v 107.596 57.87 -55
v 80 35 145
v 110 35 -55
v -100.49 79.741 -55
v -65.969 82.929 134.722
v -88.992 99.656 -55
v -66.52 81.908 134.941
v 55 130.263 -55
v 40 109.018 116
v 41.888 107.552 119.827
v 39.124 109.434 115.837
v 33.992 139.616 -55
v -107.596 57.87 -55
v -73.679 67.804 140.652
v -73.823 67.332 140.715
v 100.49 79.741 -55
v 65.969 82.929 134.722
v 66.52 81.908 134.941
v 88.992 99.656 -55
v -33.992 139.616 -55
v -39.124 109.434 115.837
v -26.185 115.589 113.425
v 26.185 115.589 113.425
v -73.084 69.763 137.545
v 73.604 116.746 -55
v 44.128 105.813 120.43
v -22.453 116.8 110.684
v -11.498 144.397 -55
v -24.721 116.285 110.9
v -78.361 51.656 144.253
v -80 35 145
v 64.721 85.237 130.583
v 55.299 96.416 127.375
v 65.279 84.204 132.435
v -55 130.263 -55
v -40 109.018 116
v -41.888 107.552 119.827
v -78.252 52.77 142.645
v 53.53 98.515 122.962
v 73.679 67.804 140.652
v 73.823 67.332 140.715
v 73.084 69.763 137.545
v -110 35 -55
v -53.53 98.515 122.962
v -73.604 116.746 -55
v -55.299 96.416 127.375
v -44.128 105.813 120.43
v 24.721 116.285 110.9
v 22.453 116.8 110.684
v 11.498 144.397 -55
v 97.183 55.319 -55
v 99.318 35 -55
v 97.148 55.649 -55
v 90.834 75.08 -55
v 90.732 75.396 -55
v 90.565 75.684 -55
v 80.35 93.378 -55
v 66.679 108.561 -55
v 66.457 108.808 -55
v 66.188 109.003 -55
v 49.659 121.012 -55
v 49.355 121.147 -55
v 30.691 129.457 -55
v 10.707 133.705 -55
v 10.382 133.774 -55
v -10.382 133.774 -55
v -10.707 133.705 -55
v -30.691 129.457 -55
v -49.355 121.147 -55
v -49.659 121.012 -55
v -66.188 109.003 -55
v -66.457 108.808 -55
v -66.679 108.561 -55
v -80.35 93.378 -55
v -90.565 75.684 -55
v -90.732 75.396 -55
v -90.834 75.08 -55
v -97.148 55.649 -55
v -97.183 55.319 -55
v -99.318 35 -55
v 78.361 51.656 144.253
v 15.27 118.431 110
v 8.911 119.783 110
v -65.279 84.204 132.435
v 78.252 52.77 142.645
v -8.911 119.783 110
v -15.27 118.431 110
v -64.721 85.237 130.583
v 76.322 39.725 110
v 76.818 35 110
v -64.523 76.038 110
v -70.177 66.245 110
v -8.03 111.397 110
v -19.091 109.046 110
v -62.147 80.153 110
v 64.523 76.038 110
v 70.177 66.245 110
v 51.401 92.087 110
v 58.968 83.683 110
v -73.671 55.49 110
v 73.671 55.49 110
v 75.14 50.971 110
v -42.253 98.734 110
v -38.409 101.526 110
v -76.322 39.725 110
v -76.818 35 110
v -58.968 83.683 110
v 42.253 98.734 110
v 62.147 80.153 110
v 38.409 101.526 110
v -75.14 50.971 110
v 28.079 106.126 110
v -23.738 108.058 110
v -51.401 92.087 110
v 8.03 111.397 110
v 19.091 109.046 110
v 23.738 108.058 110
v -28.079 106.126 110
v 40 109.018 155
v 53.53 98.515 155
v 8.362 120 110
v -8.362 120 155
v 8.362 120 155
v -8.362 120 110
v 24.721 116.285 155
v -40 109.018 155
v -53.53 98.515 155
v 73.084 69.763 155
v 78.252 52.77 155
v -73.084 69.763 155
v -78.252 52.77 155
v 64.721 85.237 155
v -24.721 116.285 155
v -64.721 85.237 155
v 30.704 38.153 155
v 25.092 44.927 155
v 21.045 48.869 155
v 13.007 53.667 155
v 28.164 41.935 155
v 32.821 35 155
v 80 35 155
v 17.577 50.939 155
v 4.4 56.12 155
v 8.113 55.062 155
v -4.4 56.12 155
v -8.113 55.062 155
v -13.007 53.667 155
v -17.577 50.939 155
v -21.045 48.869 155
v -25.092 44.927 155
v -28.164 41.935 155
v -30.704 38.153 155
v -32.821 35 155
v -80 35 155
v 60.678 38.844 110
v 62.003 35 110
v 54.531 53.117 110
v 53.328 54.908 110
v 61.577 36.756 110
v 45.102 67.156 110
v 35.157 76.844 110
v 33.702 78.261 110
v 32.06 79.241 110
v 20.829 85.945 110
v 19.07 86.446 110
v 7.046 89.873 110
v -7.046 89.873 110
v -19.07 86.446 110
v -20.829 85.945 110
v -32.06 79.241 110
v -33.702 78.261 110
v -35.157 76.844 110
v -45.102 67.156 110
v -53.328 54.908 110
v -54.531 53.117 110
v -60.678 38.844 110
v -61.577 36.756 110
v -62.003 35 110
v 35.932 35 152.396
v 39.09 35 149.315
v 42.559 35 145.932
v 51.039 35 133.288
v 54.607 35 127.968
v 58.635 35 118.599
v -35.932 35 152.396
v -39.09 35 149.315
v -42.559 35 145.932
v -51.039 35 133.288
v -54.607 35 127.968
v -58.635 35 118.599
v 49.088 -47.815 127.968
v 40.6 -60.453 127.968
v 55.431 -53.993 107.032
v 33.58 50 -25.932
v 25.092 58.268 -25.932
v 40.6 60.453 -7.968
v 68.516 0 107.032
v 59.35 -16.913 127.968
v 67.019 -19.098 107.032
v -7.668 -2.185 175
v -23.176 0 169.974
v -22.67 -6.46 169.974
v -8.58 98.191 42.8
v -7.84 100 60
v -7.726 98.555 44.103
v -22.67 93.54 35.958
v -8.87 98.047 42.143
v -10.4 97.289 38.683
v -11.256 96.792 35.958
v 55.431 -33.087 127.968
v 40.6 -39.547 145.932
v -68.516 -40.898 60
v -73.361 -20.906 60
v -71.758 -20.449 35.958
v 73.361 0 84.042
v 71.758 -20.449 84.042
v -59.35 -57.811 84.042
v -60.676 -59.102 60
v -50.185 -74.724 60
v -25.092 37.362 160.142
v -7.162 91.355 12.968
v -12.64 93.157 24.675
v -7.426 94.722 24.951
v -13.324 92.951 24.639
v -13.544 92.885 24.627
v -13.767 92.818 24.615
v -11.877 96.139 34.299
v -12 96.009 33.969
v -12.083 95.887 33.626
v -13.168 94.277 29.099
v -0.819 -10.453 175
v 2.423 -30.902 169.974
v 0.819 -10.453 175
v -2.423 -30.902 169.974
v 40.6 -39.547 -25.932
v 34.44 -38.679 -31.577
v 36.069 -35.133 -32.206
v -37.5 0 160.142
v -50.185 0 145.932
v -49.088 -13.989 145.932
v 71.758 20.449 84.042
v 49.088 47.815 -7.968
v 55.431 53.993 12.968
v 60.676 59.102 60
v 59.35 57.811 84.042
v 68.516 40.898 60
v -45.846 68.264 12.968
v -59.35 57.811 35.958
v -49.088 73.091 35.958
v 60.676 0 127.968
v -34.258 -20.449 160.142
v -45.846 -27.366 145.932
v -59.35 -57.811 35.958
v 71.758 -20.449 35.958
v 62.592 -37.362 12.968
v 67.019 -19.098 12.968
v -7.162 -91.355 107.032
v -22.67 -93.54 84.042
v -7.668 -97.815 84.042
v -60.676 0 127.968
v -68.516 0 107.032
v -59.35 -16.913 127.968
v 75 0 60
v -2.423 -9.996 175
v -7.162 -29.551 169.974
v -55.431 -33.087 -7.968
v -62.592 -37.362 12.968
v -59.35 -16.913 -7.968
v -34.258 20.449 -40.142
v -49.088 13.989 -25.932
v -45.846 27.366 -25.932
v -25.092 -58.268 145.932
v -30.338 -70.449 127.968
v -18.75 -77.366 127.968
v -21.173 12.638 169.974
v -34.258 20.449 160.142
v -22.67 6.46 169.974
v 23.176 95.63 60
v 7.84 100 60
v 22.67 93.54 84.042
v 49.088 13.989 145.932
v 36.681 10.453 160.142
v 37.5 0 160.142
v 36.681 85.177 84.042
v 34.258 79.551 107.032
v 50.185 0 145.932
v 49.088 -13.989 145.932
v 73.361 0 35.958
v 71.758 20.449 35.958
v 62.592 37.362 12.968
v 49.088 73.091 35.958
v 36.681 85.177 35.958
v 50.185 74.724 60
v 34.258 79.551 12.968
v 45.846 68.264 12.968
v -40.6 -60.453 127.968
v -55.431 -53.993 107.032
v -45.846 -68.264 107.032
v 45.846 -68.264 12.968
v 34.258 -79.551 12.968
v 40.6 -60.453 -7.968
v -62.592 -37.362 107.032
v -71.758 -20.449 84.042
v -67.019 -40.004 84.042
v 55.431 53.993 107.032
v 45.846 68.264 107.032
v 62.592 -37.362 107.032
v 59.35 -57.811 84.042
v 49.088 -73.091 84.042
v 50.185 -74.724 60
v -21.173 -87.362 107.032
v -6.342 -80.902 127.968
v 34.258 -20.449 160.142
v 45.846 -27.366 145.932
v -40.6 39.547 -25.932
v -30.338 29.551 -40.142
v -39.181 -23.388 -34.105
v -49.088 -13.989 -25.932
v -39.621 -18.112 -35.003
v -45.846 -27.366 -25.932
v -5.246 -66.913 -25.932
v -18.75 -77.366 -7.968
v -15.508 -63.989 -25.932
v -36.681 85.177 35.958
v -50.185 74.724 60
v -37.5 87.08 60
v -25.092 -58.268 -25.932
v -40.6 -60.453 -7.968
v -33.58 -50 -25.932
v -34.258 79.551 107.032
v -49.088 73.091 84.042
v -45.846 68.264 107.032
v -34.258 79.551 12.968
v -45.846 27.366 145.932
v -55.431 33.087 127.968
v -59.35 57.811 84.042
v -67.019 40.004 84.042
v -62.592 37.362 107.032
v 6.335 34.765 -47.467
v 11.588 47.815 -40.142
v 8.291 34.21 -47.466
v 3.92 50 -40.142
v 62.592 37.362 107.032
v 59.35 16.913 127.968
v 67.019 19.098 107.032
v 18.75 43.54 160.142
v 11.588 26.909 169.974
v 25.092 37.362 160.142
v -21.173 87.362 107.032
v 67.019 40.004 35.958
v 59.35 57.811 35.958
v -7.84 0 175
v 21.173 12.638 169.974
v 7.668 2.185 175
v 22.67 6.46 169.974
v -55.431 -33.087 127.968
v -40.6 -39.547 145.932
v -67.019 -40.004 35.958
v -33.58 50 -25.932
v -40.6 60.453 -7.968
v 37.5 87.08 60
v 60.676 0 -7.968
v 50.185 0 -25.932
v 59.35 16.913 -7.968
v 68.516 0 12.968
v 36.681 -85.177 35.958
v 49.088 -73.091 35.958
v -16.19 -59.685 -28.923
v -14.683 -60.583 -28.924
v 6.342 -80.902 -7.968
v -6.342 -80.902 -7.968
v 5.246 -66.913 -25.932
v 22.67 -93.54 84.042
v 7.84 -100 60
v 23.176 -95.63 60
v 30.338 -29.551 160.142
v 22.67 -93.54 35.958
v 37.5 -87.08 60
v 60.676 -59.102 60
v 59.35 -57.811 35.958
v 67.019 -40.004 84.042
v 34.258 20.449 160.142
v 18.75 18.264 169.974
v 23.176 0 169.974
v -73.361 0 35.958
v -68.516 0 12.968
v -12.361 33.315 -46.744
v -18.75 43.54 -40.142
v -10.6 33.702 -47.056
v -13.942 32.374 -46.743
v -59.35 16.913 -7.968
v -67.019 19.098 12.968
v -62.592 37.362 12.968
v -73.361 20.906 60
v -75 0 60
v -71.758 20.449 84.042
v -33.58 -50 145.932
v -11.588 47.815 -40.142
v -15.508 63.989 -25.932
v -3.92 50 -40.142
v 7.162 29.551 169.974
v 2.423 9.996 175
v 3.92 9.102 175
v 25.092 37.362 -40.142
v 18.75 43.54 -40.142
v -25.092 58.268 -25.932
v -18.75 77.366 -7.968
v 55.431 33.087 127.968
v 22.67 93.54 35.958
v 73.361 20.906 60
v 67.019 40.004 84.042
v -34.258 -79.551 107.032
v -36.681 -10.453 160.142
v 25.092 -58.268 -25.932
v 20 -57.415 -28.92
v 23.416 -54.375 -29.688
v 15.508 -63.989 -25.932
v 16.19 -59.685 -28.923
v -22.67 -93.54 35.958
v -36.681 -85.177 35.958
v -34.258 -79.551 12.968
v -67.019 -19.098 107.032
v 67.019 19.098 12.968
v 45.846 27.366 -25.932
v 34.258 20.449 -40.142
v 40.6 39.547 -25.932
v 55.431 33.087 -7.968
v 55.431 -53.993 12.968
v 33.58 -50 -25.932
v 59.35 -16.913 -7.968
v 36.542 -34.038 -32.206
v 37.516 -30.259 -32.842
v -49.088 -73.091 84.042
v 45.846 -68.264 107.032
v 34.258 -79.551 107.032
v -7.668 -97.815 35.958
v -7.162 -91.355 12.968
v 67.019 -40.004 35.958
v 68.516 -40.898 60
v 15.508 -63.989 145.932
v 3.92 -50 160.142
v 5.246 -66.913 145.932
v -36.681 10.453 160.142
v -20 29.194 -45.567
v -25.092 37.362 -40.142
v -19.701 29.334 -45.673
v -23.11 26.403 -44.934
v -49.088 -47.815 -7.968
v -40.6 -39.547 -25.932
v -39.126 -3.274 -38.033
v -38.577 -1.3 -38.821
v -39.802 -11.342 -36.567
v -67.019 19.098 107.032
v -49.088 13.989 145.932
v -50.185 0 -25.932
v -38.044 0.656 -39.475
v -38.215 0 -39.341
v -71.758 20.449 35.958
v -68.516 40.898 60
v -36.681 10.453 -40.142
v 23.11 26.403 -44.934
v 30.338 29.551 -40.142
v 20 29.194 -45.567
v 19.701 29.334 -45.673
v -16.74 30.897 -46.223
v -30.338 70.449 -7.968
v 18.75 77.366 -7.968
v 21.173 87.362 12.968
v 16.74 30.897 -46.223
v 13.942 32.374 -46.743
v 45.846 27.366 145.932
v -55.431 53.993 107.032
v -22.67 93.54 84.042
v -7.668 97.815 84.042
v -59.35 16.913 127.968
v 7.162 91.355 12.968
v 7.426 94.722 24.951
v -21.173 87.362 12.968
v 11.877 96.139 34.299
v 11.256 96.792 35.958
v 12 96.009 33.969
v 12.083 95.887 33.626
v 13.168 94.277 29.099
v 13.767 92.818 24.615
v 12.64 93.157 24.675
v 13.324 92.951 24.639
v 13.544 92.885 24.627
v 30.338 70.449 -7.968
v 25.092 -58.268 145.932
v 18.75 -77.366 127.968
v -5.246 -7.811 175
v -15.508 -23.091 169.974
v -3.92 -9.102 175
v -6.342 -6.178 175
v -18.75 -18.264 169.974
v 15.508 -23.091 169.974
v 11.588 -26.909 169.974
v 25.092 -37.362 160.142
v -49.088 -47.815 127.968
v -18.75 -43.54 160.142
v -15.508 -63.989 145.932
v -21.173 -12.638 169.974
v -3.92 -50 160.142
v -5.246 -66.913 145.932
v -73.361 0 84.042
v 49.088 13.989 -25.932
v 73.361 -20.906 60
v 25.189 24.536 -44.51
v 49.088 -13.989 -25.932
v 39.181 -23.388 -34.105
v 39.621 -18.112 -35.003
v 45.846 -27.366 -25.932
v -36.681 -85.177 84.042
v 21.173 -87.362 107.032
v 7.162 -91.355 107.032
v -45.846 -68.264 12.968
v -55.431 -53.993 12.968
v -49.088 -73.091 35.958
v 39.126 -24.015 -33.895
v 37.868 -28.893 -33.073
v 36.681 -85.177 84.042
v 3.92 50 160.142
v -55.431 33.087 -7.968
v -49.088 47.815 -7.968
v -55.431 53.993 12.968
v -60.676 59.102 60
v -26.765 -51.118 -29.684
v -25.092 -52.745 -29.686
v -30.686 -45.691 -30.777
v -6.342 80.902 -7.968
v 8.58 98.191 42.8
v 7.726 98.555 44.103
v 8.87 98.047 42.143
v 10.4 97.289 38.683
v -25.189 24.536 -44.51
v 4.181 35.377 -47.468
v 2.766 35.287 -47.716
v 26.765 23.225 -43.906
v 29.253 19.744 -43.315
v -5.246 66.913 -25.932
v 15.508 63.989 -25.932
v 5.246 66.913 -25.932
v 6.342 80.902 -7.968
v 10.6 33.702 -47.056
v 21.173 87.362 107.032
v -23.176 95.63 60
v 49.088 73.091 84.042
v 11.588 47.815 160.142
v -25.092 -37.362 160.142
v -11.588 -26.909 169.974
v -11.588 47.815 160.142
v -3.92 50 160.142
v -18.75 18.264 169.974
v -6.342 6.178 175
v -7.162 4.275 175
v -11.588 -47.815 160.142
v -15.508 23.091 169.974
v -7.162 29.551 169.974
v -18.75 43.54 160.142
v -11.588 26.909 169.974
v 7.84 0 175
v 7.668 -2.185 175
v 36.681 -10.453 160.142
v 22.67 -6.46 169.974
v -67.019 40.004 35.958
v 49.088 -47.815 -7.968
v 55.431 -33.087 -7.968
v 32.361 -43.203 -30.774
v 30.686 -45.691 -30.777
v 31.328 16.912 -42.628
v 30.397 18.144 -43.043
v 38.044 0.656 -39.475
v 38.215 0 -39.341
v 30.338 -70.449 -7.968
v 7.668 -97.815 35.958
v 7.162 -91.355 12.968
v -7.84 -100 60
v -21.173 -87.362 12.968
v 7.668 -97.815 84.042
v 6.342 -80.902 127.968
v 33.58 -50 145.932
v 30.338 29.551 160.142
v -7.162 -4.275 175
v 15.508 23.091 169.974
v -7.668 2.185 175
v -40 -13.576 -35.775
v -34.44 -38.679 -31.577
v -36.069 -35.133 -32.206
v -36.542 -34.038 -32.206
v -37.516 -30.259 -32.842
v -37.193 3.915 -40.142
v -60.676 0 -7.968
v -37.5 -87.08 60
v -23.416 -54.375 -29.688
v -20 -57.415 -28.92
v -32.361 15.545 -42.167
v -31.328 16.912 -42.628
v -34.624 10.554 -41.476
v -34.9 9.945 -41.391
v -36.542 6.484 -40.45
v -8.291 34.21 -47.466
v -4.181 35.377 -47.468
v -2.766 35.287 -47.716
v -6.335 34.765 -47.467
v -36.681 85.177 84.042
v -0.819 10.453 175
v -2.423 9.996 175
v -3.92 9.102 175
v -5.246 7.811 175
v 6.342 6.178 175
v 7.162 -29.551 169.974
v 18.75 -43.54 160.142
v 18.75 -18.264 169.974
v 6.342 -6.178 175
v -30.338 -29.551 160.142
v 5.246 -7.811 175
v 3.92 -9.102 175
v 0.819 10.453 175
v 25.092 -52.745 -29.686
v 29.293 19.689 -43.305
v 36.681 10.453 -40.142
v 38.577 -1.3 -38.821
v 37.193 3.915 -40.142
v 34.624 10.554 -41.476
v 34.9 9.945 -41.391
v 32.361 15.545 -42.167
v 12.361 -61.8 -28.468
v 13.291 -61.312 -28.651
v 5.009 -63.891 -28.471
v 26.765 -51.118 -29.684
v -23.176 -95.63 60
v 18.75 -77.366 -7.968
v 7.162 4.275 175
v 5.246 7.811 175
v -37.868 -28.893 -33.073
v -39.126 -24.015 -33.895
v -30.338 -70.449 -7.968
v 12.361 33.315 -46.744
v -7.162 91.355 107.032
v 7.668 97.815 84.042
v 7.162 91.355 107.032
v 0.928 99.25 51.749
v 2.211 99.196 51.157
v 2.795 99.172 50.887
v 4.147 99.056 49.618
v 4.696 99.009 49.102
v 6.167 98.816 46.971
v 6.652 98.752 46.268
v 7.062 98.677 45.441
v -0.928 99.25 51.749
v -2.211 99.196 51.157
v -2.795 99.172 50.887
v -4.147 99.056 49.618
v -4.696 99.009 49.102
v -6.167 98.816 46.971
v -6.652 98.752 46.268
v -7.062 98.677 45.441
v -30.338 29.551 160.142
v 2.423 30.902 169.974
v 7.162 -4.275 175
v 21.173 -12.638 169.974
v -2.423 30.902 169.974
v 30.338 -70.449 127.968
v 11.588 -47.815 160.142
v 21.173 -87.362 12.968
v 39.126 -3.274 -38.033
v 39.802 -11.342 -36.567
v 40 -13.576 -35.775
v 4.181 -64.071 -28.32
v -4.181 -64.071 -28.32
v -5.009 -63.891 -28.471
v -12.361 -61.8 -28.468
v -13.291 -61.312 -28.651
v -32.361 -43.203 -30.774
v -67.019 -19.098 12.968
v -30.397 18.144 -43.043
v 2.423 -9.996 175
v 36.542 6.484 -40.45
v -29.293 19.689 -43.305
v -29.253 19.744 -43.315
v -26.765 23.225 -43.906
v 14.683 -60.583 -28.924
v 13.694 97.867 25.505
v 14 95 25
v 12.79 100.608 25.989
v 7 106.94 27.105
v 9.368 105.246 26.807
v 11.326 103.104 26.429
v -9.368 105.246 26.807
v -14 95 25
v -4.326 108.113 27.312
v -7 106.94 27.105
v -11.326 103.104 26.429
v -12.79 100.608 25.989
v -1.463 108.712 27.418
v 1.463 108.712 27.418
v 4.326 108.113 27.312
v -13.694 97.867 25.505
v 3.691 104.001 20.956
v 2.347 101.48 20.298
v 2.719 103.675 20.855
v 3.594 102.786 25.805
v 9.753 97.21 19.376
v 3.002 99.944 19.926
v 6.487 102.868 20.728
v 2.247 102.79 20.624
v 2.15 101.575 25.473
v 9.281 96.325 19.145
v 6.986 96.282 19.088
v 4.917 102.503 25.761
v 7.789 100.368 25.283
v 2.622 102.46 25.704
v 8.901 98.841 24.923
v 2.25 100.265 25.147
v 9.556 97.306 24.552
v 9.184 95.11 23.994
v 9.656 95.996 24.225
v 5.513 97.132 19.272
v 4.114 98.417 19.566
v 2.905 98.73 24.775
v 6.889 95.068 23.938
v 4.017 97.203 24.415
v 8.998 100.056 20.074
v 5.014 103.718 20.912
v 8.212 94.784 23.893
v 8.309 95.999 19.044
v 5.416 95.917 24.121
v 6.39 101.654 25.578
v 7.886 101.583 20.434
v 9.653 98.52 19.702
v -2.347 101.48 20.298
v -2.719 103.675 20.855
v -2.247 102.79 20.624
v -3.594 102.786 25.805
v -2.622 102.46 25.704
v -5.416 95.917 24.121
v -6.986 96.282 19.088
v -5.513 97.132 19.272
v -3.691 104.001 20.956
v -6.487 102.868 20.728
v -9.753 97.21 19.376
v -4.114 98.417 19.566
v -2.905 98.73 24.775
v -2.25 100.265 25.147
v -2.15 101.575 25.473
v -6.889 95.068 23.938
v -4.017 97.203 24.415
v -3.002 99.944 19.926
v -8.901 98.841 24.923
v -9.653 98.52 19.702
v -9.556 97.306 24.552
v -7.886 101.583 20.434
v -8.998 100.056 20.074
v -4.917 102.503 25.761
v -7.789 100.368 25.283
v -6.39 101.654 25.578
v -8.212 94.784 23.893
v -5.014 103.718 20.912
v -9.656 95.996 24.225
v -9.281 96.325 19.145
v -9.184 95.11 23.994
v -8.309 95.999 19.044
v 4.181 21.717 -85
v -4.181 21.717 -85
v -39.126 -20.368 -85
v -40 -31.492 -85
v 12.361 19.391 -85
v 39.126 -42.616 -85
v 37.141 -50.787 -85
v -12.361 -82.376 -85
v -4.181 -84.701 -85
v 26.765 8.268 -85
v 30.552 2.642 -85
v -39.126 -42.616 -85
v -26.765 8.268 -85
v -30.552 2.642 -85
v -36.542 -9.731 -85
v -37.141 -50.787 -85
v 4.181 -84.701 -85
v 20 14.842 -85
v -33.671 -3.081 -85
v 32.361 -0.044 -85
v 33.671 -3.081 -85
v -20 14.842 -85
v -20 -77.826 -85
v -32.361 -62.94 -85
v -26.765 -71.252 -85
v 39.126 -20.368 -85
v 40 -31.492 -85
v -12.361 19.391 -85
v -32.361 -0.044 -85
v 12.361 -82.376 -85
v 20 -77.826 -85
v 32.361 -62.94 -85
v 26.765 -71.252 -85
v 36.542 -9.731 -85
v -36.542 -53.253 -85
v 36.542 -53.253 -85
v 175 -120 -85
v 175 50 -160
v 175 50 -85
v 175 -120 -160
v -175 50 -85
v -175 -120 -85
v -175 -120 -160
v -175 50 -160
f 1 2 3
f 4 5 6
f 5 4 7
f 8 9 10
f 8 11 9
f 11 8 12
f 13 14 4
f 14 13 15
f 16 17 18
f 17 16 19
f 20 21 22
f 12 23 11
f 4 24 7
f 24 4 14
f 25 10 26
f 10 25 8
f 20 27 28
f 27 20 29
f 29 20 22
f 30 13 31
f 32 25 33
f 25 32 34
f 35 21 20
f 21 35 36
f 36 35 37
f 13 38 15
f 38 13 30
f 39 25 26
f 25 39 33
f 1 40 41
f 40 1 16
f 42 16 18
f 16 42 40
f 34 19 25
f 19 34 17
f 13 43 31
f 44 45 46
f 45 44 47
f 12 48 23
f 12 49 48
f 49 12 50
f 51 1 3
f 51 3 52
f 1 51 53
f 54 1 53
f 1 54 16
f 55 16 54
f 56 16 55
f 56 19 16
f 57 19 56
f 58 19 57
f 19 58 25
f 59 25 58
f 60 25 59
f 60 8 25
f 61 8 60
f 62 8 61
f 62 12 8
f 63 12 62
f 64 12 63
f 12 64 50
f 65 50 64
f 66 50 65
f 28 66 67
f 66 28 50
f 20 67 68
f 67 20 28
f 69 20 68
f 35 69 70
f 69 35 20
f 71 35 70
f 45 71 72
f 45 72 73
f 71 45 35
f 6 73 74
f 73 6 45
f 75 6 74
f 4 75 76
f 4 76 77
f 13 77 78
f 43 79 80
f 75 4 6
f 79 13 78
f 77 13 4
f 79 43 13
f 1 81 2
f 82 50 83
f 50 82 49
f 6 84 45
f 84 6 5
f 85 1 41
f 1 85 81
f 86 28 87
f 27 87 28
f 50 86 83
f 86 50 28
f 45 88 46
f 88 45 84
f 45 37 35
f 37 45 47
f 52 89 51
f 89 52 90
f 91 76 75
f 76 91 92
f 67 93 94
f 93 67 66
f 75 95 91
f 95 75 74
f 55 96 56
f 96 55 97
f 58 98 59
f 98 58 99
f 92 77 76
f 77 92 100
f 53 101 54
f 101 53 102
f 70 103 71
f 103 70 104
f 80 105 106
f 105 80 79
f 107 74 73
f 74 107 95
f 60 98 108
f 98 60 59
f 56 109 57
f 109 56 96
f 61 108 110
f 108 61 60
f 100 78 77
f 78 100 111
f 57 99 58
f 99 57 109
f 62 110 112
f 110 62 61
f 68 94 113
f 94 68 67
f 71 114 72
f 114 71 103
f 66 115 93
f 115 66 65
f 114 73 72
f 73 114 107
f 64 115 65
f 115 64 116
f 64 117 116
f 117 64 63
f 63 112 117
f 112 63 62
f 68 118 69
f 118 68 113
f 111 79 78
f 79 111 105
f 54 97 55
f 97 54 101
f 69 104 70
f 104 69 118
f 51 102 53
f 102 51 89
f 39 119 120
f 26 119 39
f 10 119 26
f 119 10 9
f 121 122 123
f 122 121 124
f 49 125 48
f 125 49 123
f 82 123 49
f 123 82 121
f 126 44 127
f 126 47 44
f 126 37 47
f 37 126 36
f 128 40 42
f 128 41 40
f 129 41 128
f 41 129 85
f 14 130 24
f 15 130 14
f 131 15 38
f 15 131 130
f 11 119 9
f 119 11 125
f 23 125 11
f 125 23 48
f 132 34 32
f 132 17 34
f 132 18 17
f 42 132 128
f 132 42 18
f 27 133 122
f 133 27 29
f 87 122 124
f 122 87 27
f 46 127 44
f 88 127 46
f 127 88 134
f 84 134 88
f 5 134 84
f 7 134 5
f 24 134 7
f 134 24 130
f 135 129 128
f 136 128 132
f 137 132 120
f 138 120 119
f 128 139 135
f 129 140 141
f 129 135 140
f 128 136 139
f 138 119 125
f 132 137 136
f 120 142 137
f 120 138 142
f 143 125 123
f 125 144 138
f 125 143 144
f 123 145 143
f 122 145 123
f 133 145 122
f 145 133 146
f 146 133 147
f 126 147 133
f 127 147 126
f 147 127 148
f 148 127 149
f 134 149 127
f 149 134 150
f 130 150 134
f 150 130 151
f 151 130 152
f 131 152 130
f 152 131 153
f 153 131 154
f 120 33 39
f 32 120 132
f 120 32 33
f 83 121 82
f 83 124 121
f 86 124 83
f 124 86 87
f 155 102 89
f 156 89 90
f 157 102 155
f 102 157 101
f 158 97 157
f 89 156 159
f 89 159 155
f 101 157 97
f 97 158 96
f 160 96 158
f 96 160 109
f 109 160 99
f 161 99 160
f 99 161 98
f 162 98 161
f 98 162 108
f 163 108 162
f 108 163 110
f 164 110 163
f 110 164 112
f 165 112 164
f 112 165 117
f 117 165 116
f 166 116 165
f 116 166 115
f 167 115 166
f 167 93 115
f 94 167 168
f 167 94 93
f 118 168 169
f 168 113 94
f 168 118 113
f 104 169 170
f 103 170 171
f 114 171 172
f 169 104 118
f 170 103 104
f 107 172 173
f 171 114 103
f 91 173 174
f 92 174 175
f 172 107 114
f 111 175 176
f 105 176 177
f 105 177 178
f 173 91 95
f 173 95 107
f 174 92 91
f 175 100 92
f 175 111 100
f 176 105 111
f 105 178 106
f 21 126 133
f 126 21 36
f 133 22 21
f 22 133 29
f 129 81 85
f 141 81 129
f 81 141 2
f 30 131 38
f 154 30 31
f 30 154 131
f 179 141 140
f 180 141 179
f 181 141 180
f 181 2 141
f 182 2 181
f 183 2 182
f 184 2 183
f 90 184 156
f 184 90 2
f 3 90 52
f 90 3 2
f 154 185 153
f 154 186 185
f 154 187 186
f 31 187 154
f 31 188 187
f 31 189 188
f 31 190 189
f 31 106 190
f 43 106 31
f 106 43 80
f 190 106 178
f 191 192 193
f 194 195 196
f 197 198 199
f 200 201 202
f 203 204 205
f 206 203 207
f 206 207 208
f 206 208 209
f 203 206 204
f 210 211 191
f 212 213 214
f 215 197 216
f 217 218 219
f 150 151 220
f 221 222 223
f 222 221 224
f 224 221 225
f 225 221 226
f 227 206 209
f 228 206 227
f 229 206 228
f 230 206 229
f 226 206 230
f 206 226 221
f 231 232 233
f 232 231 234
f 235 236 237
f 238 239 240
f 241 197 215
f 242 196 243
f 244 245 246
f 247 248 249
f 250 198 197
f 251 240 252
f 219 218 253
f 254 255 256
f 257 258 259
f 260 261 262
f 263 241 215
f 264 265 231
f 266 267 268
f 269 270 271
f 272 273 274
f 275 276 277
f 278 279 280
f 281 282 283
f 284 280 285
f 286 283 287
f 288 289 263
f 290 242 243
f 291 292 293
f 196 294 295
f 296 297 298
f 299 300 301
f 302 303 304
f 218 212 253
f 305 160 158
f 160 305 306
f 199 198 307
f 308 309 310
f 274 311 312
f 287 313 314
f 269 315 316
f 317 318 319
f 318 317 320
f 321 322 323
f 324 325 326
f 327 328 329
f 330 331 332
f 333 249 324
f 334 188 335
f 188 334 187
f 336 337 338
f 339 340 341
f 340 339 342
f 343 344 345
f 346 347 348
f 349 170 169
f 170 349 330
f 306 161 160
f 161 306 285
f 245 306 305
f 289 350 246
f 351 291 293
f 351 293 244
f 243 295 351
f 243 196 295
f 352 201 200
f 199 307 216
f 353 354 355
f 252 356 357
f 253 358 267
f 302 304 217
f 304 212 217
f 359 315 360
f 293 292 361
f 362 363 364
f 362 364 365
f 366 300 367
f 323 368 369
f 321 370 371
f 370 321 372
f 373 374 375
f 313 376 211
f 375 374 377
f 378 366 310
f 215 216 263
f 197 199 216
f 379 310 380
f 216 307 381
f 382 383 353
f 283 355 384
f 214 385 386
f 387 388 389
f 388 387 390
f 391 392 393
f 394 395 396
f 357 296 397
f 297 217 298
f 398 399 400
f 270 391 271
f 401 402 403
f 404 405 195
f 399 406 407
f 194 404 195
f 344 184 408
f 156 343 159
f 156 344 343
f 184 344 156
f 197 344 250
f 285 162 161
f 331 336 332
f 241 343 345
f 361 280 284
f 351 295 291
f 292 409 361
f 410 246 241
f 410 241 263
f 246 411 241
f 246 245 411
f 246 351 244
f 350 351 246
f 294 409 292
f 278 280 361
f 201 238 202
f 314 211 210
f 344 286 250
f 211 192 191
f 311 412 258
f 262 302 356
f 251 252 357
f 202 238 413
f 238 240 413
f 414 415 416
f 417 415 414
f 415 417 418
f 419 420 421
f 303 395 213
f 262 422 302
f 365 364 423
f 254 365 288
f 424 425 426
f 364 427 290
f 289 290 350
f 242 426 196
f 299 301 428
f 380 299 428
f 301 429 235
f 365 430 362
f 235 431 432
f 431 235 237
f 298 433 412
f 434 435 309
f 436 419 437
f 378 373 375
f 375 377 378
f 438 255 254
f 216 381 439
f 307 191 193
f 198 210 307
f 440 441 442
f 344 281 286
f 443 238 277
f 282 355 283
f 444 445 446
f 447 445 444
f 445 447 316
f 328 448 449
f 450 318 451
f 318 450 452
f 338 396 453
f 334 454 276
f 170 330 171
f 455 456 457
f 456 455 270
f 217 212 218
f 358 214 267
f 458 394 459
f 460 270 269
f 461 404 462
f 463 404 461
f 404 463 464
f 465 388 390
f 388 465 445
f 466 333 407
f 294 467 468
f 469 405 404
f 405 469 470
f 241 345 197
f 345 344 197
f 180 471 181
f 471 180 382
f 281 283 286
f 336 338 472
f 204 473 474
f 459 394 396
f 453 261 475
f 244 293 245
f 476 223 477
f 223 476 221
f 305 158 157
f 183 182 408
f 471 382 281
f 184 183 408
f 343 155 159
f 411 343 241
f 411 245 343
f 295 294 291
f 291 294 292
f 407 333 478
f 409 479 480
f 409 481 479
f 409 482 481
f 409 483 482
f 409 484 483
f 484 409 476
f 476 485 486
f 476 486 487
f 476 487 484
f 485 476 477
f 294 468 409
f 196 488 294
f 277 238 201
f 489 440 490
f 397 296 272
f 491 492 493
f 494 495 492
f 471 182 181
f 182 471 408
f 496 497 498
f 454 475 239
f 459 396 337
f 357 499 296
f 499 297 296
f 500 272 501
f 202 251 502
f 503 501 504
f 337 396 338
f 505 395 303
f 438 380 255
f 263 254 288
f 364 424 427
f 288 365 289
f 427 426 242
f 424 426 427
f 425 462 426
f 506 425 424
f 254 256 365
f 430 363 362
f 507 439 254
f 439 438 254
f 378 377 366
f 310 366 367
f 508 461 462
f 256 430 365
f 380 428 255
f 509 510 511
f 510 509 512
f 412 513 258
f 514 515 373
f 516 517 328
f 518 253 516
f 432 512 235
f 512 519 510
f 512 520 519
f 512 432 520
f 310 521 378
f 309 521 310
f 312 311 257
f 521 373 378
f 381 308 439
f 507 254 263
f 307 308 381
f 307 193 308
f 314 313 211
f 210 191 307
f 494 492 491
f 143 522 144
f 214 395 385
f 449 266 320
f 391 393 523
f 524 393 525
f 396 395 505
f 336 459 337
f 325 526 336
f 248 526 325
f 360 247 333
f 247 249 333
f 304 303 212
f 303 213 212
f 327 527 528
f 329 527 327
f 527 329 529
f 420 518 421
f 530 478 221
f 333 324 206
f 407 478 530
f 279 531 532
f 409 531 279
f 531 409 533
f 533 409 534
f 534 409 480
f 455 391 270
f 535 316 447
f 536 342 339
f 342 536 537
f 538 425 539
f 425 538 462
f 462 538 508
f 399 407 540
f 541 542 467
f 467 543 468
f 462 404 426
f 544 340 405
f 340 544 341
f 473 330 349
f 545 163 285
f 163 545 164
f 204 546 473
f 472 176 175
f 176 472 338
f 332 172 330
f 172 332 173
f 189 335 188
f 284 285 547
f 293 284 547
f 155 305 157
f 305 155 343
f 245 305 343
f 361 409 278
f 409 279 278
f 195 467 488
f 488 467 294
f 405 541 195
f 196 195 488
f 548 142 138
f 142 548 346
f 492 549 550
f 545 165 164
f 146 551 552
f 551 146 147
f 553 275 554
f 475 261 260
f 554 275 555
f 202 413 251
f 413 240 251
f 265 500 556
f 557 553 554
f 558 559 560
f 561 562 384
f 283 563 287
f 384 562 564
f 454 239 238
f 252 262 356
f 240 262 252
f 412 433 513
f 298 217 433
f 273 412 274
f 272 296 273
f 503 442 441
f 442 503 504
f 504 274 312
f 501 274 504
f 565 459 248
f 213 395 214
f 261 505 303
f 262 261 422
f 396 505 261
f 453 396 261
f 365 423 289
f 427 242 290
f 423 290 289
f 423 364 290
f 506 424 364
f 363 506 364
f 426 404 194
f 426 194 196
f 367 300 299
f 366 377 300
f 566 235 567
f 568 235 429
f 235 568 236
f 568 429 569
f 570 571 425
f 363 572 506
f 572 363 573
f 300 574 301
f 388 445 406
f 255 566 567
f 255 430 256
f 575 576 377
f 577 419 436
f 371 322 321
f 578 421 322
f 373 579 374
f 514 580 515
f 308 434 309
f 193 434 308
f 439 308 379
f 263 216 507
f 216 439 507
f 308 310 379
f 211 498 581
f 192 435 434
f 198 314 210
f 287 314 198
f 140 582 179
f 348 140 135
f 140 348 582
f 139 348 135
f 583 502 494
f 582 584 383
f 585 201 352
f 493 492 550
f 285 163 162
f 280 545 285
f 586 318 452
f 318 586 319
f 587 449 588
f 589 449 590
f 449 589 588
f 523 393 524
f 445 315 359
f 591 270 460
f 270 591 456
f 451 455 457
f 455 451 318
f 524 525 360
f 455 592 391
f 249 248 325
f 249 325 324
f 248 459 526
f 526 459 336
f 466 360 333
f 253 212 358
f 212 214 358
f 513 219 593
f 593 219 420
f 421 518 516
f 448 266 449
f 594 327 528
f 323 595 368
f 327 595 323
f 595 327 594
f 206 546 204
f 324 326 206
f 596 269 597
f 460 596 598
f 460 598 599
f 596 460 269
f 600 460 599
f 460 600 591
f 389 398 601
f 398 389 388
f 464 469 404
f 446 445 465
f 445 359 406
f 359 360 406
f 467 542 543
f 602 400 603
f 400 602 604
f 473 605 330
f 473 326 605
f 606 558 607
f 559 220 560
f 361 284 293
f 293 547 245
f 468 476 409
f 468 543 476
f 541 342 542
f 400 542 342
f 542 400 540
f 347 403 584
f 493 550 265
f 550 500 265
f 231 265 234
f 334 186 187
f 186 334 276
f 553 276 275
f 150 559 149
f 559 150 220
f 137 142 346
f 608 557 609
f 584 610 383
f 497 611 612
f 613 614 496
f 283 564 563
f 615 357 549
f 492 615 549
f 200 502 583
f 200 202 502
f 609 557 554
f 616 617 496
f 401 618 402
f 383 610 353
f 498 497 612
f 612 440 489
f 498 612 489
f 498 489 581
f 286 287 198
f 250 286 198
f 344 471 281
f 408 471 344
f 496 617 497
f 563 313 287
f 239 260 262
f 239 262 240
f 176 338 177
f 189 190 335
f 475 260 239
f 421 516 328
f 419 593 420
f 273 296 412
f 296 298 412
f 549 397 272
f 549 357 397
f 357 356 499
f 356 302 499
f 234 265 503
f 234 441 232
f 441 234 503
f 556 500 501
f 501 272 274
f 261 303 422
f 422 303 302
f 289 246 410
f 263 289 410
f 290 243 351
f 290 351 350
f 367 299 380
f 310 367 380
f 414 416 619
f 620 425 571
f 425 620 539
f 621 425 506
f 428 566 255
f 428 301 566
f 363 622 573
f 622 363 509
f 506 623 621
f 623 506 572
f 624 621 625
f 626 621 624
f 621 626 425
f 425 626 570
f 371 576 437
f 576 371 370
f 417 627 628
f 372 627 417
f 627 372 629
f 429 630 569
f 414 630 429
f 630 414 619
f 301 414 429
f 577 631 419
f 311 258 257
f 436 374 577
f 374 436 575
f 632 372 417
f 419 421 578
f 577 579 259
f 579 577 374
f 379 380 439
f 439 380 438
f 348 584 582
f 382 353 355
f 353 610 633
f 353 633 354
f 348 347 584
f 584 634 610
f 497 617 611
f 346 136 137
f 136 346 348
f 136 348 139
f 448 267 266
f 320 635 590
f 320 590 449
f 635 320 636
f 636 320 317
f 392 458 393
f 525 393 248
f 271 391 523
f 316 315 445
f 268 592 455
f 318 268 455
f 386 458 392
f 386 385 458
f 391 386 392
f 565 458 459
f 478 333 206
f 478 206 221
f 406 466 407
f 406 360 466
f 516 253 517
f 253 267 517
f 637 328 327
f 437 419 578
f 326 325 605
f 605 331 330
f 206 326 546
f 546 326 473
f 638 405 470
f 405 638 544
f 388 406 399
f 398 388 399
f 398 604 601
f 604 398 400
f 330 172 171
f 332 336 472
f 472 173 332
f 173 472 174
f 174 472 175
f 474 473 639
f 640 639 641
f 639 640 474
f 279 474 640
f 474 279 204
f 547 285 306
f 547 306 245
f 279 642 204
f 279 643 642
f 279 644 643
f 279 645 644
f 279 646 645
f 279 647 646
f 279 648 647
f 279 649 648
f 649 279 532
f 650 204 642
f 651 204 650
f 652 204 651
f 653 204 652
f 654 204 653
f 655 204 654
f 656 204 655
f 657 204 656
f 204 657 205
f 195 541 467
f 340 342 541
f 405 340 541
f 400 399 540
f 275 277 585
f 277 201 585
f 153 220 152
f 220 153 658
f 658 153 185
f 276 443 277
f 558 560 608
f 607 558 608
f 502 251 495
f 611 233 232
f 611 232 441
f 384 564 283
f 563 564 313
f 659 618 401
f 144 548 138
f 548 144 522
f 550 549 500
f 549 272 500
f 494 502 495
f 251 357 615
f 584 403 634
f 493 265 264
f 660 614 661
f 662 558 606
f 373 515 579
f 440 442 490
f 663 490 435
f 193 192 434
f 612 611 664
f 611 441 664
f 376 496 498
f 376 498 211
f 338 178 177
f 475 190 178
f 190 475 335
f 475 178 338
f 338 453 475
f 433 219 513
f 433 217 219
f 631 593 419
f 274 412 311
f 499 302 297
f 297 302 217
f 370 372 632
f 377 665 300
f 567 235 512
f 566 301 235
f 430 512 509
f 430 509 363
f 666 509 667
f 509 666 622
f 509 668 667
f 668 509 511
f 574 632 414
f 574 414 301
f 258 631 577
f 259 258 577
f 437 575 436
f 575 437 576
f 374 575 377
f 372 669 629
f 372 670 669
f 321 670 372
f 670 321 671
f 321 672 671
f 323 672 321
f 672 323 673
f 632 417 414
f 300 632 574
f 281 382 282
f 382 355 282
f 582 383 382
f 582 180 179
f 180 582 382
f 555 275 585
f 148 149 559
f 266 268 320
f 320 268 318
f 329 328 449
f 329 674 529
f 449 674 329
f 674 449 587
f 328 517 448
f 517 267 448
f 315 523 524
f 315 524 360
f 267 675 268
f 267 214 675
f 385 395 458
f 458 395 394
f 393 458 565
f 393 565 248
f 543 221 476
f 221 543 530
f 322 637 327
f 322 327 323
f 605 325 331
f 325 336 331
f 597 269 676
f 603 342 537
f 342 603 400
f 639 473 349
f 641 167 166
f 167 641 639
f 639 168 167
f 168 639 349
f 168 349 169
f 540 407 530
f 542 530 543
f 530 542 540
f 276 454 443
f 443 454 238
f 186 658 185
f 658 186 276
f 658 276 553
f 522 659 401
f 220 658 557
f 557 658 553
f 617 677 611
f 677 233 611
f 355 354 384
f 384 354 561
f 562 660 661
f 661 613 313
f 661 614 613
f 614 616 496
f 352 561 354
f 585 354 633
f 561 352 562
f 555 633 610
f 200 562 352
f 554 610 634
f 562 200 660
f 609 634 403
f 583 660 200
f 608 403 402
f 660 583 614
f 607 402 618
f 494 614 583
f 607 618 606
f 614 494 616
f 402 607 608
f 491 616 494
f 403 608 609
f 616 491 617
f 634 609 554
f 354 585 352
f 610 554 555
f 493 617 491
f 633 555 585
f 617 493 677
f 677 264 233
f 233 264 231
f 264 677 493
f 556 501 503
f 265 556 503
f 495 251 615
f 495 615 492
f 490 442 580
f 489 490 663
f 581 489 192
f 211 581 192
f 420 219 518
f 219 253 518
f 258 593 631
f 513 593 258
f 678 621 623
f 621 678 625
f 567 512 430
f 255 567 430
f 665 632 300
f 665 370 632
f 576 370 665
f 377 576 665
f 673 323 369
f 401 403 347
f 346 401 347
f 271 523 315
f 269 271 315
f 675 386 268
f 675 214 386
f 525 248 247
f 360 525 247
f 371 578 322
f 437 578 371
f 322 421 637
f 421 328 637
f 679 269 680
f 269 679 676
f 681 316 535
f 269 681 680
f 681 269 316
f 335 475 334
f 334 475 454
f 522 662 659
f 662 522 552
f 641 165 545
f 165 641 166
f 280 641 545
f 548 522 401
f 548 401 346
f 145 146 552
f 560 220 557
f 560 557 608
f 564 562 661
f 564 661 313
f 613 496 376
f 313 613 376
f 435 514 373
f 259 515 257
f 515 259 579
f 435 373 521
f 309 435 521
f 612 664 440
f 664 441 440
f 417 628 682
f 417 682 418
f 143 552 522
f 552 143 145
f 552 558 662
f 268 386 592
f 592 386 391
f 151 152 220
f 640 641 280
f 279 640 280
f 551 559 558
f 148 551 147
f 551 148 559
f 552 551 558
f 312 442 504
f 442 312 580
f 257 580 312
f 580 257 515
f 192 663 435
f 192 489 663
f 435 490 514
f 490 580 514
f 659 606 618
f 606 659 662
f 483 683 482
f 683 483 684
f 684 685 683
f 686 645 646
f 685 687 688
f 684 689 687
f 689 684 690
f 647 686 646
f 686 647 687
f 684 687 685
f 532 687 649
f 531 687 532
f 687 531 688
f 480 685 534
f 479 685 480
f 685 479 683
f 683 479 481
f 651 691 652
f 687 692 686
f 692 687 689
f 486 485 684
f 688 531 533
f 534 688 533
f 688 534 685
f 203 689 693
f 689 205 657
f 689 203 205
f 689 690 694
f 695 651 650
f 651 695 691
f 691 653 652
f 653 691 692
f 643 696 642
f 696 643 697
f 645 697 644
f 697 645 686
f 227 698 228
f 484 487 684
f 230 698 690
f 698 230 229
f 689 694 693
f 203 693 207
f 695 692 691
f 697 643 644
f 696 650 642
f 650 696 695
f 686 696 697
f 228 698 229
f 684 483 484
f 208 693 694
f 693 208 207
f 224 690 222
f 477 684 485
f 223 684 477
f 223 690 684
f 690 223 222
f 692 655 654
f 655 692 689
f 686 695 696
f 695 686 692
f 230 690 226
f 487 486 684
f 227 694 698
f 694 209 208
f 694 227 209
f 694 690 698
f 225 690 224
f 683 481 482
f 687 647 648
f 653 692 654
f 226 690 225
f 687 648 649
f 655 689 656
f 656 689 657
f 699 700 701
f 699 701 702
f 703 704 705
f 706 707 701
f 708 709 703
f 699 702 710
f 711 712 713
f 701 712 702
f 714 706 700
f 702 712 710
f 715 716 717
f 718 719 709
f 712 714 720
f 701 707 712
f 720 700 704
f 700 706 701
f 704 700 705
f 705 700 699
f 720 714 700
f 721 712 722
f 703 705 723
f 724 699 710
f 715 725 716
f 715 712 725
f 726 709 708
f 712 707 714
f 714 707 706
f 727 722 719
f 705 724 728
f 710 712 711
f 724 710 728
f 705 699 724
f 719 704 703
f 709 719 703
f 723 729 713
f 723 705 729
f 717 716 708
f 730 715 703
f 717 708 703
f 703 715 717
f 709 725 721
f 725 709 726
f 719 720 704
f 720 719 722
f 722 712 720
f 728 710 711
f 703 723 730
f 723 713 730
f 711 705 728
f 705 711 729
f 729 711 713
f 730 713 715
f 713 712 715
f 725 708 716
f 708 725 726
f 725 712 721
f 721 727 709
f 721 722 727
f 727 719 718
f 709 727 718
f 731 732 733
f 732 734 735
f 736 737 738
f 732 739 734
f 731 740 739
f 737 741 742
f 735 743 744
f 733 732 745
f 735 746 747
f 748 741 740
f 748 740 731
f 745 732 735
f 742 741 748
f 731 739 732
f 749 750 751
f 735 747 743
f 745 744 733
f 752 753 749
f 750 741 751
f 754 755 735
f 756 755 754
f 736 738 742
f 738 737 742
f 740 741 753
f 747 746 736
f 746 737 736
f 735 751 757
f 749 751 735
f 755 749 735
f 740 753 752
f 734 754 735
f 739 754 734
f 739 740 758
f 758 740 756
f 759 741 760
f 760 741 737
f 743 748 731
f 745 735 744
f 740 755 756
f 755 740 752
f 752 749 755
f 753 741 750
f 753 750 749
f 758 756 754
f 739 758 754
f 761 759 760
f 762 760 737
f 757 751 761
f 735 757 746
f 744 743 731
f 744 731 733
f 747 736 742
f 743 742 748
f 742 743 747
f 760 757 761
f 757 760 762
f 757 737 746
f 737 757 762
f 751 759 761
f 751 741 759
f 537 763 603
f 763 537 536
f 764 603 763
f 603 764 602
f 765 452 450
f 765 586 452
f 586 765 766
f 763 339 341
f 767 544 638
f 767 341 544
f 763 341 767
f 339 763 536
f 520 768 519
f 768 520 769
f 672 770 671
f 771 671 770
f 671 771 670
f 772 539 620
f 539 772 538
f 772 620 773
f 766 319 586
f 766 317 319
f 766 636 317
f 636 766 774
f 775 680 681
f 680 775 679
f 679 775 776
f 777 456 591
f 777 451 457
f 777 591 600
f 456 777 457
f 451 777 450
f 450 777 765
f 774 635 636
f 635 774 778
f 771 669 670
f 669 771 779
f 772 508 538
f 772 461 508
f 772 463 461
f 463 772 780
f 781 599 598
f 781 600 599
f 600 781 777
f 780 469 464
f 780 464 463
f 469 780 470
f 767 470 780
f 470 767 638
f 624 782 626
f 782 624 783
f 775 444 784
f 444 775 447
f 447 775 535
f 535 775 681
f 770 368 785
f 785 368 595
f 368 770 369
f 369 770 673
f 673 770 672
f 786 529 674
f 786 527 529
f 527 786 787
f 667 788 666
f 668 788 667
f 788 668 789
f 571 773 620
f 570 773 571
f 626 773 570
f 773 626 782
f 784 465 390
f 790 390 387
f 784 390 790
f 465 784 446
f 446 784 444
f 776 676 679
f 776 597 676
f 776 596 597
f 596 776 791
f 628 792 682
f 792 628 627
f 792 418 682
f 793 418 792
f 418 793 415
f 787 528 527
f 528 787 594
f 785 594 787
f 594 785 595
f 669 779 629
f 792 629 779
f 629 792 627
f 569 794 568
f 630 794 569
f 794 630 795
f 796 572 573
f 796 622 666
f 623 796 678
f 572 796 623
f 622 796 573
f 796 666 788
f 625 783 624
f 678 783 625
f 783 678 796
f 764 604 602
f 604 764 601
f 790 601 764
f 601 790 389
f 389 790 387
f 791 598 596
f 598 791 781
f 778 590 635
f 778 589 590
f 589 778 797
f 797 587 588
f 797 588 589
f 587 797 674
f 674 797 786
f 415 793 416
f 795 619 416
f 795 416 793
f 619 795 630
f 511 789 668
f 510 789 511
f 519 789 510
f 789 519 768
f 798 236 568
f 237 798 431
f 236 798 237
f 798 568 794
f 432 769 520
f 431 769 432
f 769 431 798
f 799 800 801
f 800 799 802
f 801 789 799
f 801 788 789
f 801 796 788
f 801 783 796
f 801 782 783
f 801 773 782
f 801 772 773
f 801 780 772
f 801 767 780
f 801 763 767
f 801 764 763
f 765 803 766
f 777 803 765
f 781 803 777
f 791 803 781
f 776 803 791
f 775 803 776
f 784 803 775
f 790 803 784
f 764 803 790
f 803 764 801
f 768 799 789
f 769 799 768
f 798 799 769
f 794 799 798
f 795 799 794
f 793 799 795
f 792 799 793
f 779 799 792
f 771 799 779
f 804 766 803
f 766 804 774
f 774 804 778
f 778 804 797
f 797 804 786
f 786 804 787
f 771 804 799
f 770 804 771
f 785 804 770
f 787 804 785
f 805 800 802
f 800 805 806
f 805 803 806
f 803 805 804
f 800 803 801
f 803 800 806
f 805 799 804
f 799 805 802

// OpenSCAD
translate([0,0,60])
    union() {

        difference() {
            
            union() {
                
                // shield
                difference() {
                    translate([0,35,-115])
                        cylinder(h=200, r1=110, r2=80); // front
                    translate([0,35,-120])
                        cylinder(h=220, r1=100, r2=70); // back
                }
                
                // connection
                translate([0,35,50])
                    linear_extrude(height=45) // recess ignored
                        resize([160,170])
                            circle(d=100);
            }
            
            // remove half of above volumes
            translate([-150,-365,-150])
                cube(400);  

        }

        // Dimensions: https://en.wikipedia.org/wiki/Human_head#Average_head_sizes 

        // head
        resize(newsize=[150, 200, 230])
            sphere(r=100);

        // nose
        translate([0,95,-35])
            rotate(a=[10,0,0])
                cylinder(h=45, r1=14, r2=5);
        
        // nostrils
        translate([6,100,-40])
            rotate(a=[10,-10,40])
                linear_extrude(height=5)
                    resize([5, 10])
                        circle(d=10);
        translate([-6,100,-40])
            rotate(a=[10,10,-40])
                linear_extrude(height=5)
                    resize([5, 10])
                        circle(d=10); 
        
        // neck
        rotate([-20,0,0])
            translate([0,20,-200])
                linear_extrude(height=200)
                    resize([80,100])
                        circle(d=100);
        
        // body
        translate([-175,-120,-220])
            cube([350,170,75]);
        
        // fan
        //translate([0,80,-200])
        //    linear_extrude(height=40)
        //        circle(d=40);
        //translate([-10,-20,-190])
        //    cube([20,100,20]);
    }
